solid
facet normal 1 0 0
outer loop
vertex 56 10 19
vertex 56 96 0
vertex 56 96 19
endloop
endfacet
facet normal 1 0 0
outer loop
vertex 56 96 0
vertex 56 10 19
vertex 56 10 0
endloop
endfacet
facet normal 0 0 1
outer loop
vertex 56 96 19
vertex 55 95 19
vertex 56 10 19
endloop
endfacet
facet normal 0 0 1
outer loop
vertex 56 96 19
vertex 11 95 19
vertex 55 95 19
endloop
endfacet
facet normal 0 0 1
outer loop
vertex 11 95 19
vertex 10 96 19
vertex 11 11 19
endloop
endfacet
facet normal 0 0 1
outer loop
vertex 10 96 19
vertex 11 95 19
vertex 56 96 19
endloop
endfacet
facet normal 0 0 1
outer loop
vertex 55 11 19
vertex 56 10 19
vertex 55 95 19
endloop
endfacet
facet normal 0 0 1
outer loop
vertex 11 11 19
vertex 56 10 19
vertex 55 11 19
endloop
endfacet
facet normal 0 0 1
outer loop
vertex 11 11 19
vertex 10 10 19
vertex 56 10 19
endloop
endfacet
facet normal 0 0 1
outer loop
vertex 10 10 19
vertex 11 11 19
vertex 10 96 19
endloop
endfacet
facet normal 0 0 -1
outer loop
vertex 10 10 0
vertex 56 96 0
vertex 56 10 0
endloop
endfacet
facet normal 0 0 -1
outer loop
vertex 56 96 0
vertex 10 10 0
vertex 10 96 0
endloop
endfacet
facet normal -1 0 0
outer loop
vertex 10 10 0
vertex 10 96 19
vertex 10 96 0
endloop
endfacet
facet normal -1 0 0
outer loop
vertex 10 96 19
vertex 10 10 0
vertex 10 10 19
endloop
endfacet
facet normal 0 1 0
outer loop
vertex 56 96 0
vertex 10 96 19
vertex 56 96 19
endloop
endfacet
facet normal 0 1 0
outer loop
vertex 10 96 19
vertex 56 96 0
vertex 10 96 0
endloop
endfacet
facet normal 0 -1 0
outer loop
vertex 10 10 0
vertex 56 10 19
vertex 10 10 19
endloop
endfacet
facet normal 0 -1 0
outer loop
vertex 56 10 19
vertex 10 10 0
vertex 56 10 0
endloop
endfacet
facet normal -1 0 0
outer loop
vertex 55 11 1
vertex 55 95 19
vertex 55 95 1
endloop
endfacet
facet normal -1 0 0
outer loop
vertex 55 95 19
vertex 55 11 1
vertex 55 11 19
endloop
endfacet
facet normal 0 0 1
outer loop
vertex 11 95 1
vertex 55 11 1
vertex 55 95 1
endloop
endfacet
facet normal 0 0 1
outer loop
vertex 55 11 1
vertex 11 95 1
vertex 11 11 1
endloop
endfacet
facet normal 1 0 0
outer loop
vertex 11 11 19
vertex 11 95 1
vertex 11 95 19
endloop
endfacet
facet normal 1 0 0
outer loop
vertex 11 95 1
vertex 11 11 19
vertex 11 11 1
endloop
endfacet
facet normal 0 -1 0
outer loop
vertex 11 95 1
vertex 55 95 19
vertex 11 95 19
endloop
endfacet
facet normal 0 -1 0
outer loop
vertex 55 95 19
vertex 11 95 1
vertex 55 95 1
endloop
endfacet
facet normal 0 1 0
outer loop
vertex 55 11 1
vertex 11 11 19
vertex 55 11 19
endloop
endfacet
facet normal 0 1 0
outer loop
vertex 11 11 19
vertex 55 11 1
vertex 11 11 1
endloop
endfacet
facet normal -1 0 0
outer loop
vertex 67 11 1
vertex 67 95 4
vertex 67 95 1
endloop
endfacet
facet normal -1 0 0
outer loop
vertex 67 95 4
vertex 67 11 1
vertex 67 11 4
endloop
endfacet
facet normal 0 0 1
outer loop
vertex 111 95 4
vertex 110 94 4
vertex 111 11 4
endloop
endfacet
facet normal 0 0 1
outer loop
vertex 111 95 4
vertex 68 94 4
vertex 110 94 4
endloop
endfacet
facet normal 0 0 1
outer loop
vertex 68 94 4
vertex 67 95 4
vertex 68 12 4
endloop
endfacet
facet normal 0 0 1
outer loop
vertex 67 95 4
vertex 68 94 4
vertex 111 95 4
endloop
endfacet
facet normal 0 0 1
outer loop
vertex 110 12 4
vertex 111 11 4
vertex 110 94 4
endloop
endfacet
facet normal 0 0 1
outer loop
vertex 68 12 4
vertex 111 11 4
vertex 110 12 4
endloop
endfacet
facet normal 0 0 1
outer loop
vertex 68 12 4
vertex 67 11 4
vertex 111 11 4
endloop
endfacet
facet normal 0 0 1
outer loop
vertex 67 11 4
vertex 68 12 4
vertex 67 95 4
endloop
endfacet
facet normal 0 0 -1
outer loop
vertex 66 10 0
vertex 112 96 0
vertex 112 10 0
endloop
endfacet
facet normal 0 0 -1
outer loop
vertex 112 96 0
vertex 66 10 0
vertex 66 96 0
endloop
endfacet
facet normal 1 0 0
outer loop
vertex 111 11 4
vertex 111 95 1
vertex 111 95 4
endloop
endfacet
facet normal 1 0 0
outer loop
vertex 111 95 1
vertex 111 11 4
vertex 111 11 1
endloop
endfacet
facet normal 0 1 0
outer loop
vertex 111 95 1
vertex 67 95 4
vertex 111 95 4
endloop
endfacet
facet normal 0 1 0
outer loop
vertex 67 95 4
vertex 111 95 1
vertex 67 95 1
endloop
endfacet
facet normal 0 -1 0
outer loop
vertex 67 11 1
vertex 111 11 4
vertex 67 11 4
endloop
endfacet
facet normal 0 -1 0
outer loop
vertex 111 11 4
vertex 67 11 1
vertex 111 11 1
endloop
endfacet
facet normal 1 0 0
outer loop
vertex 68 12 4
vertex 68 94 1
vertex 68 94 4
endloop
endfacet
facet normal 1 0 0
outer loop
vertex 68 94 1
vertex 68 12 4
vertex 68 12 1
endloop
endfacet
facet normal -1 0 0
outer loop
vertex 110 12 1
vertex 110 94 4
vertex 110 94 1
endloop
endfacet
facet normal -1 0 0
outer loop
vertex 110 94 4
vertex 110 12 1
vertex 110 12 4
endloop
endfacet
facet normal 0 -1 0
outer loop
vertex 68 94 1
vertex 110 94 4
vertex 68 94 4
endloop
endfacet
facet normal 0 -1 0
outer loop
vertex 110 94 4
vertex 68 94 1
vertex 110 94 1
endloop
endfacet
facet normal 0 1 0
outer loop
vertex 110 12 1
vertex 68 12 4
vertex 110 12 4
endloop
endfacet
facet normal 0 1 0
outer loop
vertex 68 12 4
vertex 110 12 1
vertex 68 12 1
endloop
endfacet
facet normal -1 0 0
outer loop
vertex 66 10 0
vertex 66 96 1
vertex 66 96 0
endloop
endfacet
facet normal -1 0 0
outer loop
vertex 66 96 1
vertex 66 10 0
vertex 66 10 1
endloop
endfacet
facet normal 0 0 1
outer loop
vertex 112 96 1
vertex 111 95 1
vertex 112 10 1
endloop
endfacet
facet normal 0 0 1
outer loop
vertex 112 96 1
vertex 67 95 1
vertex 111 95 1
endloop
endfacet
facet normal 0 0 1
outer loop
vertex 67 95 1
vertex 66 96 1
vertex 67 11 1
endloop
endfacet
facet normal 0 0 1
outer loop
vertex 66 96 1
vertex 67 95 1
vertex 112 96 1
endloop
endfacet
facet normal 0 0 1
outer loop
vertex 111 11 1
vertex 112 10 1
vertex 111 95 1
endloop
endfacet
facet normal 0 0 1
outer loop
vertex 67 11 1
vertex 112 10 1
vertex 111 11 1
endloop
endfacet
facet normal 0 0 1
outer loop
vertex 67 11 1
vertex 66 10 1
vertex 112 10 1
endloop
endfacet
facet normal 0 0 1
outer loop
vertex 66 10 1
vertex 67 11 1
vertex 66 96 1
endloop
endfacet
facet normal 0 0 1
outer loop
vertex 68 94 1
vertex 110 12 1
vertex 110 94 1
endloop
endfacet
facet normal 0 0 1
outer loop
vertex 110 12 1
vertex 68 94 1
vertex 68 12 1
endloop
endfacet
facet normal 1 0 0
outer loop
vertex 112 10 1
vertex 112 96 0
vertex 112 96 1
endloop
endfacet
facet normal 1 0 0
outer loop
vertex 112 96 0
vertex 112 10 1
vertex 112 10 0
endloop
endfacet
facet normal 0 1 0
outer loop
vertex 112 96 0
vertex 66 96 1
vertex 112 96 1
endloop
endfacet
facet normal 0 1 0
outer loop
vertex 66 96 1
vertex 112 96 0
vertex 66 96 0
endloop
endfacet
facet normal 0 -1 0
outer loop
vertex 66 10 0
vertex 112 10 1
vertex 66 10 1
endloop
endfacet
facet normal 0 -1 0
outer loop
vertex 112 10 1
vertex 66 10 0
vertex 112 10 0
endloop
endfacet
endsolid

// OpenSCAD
$fn=200;

length = 86;
width= 46;
height = 19;
cornerRadius = 0;

translate([10, 10, 0]){
    difference() {
            roundedBox(length, width, height, cornerRadius); 
            translate([1,1,1]) {
                roundedBox(length-2, width-2, height-1, cornerRadius); 
            }
    }
}


translate([((width*2) + 20), 10, 0]){
    mirror([1,0,0]) {
        roundedBox(length, width, 1, cornerRadius);
        difference() {
            translate([1,1,0]) {
                roundedBox(length-2,width-2,4,cornerRadius);
            }
            translate([2,2,0]) {
                roundedBox(length-4,width-4,4,cornerRadius);
            }    
        }
    }
}




module roundedBox(length, width, height, radius)
{
    dRadius = 2*radius;

    //cube bottom right
    translate([width-dRadius,-radius,0]) {
        cube(size=[radius,radius,height+0.01]);
    }

    //cube top left
    translate([-radius,length-dRadius,0]) {
        cube(size=[radius,radius,height+0.01]);
    }

    //base rounded shape
    minkowski() {
        cube(size=[width-dRadius,length-dRadius, height]);
        cylinder(r=radius, h=0.01);
    }
  
    
  
}
